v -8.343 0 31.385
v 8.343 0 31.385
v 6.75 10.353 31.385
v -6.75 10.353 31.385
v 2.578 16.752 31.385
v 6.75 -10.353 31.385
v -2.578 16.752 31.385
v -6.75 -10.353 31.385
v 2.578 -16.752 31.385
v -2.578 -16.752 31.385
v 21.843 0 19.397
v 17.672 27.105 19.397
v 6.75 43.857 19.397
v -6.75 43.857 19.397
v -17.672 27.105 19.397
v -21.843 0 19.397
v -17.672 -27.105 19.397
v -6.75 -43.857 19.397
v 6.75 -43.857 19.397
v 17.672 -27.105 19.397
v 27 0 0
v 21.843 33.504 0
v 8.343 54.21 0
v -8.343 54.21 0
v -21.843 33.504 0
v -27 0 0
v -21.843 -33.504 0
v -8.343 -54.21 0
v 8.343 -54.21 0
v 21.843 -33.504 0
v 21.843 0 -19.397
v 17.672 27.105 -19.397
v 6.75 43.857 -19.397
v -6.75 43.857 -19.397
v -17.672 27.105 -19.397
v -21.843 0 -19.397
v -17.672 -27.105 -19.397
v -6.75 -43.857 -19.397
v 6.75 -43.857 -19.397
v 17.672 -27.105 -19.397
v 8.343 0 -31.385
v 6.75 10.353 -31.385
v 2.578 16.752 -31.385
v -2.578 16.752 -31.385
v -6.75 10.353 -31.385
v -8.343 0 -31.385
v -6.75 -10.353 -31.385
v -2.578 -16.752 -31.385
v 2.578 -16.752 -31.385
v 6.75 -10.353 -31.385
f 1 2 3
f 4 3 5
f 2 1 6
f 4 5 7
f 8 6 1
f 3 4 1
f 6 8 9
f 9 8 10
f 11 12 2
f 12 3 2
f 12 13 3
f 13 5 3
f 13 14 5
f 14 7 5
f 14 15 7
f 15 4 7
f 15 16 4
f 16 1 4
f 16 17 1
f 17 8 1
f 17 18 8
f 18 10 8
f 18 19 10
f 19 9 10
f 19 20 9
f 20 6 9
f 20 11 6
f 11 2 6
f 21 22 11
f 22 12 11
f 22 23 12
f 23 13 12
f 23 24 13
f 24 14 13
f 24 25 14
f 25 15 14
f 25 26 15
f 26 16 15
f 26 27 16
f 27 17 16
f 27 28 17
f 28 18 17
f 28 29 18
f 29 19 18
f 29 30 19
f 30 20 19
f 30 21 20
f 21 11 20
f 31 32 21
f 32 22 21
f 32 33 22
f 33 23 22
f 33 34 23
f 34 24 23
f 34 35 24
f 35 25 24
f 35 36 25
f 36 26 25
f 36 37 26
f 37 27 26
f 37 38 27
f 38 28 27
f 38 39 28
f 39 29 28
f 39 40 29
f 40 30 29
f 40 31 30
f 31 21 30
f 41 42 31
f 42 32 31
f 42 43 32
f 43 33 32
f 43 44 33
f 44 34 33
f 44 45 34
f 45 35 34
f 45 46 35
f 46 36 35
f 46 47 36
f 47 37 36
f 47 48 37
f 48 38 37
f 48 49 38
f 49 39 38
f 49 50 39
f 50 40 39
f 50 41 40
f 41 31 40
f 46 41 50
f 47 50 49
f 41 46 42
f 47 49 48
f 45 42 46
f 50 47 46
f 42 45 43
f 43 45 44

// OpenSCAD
// Generated by SolidPython 1.0.1 on 2020-07-29 00:46:49


scale(v = [9, 19, 11]) {
	sphere(r = 3);
}
/***********************************************
*********      SolidPython code:      **********
************************************************
 
# import packages: SolidPython
from solid import *
from solid.utils import *
from itertools import chain, combinations, permutations


class Resize:

    def __init__(self, scad_file):
        self.scad_file = scad_file
        #self.scad_file = import_scad(scad_file)
        # cone/cylinder param:
        self.r1 = 0
        self.r2 = 0
        self.h = 0
        # rectangular prism param:
        self.w = 0
        self.l = 0
        # ellipse param:
        self.r = 0

    # import OpenScad code (file name corresponds to shape)


    # classify shape + parameters
    def assign(self, param1, param2, param3):
        if self.scad_file == 'cone.scad':
            self.r1 = param1
            self.r2 = param2
            self.h = param3
        elif self.scad_file == 'cylinder.scad':
            self.r1 = param1
            self.r2 = param2
            self.h = param3
        elif self.scad_file == 'rectangularPrism.scad':
            self.h = param1
            self.l = param2
            self.w = param3
        else:
            self.r = param1
            self.h = param2

    # resize parameters
    def iterate(self):
        x = range(3, 20, 2)
        i = 1
        if self.scad_file == 'cone.scad':
            tempList = list(permutations(x, 2))
            for temp in tempList:
                param1 = temp[0]
                param2 = temp[1]
                filepath = 'produced_scad_files/' + 'cone' + str(param1) + '_' + str(param2) + '_' + '.scad'
                scad_render_to_file(cylinder(h=param1, r1=param2, r2=0), filepath)

        elif self.scad_file == 'cylinder.scad':
            tempList = list(permutations(x, 3))
            for temp in tempList:
                param1 = temp[0]
                param2 = temp[1]
                filepath = 'produced_scad_files/' + 'cylinder' + str(param1) + '_' + str(param2) + '_' + '.scad'
                scad_render_to_file(cylinder(h=param1, r1=param2, r2=param2), filepath)

        elif self.scad_file == 'rectangularPrism.scad':
            tempList = list(permutations(x, 3))
            for temp in tempList:
                param1 = temp[0]
                param2 = temp[1]
                param3 = temp[2]
                filepath = 'produced_scad_files/' + 'rectangularPrism' + str(param1) + '_' + str(param2) + '_' + str(
                    param3) + '.scad'
                scad_render_to_file(cube(size=(param1, param2, param3)), filepath)

        elif self.scad_file == 'ellipse.scad':
            tempList = list(permutations(x, 4))
            for temp in tempList:
                param1 = temp[0]
                param2 = temp[1]
                param3 = temp[2]
                param4 = temp[3]
                filepath = 'produced_scad_files/' + 'ellipse' + str(param1) + '_' + str(param2) + '_' + str(param3) + '_' + str(param4) + '.scad'
                scad_render_to_file(scale([param1, param2, param3])(sphere(r=param4)), filepath)

    def render_to_scadfile(self):
        scad_render_to_file(scad, 'example.scad') 
 
************************************************/
